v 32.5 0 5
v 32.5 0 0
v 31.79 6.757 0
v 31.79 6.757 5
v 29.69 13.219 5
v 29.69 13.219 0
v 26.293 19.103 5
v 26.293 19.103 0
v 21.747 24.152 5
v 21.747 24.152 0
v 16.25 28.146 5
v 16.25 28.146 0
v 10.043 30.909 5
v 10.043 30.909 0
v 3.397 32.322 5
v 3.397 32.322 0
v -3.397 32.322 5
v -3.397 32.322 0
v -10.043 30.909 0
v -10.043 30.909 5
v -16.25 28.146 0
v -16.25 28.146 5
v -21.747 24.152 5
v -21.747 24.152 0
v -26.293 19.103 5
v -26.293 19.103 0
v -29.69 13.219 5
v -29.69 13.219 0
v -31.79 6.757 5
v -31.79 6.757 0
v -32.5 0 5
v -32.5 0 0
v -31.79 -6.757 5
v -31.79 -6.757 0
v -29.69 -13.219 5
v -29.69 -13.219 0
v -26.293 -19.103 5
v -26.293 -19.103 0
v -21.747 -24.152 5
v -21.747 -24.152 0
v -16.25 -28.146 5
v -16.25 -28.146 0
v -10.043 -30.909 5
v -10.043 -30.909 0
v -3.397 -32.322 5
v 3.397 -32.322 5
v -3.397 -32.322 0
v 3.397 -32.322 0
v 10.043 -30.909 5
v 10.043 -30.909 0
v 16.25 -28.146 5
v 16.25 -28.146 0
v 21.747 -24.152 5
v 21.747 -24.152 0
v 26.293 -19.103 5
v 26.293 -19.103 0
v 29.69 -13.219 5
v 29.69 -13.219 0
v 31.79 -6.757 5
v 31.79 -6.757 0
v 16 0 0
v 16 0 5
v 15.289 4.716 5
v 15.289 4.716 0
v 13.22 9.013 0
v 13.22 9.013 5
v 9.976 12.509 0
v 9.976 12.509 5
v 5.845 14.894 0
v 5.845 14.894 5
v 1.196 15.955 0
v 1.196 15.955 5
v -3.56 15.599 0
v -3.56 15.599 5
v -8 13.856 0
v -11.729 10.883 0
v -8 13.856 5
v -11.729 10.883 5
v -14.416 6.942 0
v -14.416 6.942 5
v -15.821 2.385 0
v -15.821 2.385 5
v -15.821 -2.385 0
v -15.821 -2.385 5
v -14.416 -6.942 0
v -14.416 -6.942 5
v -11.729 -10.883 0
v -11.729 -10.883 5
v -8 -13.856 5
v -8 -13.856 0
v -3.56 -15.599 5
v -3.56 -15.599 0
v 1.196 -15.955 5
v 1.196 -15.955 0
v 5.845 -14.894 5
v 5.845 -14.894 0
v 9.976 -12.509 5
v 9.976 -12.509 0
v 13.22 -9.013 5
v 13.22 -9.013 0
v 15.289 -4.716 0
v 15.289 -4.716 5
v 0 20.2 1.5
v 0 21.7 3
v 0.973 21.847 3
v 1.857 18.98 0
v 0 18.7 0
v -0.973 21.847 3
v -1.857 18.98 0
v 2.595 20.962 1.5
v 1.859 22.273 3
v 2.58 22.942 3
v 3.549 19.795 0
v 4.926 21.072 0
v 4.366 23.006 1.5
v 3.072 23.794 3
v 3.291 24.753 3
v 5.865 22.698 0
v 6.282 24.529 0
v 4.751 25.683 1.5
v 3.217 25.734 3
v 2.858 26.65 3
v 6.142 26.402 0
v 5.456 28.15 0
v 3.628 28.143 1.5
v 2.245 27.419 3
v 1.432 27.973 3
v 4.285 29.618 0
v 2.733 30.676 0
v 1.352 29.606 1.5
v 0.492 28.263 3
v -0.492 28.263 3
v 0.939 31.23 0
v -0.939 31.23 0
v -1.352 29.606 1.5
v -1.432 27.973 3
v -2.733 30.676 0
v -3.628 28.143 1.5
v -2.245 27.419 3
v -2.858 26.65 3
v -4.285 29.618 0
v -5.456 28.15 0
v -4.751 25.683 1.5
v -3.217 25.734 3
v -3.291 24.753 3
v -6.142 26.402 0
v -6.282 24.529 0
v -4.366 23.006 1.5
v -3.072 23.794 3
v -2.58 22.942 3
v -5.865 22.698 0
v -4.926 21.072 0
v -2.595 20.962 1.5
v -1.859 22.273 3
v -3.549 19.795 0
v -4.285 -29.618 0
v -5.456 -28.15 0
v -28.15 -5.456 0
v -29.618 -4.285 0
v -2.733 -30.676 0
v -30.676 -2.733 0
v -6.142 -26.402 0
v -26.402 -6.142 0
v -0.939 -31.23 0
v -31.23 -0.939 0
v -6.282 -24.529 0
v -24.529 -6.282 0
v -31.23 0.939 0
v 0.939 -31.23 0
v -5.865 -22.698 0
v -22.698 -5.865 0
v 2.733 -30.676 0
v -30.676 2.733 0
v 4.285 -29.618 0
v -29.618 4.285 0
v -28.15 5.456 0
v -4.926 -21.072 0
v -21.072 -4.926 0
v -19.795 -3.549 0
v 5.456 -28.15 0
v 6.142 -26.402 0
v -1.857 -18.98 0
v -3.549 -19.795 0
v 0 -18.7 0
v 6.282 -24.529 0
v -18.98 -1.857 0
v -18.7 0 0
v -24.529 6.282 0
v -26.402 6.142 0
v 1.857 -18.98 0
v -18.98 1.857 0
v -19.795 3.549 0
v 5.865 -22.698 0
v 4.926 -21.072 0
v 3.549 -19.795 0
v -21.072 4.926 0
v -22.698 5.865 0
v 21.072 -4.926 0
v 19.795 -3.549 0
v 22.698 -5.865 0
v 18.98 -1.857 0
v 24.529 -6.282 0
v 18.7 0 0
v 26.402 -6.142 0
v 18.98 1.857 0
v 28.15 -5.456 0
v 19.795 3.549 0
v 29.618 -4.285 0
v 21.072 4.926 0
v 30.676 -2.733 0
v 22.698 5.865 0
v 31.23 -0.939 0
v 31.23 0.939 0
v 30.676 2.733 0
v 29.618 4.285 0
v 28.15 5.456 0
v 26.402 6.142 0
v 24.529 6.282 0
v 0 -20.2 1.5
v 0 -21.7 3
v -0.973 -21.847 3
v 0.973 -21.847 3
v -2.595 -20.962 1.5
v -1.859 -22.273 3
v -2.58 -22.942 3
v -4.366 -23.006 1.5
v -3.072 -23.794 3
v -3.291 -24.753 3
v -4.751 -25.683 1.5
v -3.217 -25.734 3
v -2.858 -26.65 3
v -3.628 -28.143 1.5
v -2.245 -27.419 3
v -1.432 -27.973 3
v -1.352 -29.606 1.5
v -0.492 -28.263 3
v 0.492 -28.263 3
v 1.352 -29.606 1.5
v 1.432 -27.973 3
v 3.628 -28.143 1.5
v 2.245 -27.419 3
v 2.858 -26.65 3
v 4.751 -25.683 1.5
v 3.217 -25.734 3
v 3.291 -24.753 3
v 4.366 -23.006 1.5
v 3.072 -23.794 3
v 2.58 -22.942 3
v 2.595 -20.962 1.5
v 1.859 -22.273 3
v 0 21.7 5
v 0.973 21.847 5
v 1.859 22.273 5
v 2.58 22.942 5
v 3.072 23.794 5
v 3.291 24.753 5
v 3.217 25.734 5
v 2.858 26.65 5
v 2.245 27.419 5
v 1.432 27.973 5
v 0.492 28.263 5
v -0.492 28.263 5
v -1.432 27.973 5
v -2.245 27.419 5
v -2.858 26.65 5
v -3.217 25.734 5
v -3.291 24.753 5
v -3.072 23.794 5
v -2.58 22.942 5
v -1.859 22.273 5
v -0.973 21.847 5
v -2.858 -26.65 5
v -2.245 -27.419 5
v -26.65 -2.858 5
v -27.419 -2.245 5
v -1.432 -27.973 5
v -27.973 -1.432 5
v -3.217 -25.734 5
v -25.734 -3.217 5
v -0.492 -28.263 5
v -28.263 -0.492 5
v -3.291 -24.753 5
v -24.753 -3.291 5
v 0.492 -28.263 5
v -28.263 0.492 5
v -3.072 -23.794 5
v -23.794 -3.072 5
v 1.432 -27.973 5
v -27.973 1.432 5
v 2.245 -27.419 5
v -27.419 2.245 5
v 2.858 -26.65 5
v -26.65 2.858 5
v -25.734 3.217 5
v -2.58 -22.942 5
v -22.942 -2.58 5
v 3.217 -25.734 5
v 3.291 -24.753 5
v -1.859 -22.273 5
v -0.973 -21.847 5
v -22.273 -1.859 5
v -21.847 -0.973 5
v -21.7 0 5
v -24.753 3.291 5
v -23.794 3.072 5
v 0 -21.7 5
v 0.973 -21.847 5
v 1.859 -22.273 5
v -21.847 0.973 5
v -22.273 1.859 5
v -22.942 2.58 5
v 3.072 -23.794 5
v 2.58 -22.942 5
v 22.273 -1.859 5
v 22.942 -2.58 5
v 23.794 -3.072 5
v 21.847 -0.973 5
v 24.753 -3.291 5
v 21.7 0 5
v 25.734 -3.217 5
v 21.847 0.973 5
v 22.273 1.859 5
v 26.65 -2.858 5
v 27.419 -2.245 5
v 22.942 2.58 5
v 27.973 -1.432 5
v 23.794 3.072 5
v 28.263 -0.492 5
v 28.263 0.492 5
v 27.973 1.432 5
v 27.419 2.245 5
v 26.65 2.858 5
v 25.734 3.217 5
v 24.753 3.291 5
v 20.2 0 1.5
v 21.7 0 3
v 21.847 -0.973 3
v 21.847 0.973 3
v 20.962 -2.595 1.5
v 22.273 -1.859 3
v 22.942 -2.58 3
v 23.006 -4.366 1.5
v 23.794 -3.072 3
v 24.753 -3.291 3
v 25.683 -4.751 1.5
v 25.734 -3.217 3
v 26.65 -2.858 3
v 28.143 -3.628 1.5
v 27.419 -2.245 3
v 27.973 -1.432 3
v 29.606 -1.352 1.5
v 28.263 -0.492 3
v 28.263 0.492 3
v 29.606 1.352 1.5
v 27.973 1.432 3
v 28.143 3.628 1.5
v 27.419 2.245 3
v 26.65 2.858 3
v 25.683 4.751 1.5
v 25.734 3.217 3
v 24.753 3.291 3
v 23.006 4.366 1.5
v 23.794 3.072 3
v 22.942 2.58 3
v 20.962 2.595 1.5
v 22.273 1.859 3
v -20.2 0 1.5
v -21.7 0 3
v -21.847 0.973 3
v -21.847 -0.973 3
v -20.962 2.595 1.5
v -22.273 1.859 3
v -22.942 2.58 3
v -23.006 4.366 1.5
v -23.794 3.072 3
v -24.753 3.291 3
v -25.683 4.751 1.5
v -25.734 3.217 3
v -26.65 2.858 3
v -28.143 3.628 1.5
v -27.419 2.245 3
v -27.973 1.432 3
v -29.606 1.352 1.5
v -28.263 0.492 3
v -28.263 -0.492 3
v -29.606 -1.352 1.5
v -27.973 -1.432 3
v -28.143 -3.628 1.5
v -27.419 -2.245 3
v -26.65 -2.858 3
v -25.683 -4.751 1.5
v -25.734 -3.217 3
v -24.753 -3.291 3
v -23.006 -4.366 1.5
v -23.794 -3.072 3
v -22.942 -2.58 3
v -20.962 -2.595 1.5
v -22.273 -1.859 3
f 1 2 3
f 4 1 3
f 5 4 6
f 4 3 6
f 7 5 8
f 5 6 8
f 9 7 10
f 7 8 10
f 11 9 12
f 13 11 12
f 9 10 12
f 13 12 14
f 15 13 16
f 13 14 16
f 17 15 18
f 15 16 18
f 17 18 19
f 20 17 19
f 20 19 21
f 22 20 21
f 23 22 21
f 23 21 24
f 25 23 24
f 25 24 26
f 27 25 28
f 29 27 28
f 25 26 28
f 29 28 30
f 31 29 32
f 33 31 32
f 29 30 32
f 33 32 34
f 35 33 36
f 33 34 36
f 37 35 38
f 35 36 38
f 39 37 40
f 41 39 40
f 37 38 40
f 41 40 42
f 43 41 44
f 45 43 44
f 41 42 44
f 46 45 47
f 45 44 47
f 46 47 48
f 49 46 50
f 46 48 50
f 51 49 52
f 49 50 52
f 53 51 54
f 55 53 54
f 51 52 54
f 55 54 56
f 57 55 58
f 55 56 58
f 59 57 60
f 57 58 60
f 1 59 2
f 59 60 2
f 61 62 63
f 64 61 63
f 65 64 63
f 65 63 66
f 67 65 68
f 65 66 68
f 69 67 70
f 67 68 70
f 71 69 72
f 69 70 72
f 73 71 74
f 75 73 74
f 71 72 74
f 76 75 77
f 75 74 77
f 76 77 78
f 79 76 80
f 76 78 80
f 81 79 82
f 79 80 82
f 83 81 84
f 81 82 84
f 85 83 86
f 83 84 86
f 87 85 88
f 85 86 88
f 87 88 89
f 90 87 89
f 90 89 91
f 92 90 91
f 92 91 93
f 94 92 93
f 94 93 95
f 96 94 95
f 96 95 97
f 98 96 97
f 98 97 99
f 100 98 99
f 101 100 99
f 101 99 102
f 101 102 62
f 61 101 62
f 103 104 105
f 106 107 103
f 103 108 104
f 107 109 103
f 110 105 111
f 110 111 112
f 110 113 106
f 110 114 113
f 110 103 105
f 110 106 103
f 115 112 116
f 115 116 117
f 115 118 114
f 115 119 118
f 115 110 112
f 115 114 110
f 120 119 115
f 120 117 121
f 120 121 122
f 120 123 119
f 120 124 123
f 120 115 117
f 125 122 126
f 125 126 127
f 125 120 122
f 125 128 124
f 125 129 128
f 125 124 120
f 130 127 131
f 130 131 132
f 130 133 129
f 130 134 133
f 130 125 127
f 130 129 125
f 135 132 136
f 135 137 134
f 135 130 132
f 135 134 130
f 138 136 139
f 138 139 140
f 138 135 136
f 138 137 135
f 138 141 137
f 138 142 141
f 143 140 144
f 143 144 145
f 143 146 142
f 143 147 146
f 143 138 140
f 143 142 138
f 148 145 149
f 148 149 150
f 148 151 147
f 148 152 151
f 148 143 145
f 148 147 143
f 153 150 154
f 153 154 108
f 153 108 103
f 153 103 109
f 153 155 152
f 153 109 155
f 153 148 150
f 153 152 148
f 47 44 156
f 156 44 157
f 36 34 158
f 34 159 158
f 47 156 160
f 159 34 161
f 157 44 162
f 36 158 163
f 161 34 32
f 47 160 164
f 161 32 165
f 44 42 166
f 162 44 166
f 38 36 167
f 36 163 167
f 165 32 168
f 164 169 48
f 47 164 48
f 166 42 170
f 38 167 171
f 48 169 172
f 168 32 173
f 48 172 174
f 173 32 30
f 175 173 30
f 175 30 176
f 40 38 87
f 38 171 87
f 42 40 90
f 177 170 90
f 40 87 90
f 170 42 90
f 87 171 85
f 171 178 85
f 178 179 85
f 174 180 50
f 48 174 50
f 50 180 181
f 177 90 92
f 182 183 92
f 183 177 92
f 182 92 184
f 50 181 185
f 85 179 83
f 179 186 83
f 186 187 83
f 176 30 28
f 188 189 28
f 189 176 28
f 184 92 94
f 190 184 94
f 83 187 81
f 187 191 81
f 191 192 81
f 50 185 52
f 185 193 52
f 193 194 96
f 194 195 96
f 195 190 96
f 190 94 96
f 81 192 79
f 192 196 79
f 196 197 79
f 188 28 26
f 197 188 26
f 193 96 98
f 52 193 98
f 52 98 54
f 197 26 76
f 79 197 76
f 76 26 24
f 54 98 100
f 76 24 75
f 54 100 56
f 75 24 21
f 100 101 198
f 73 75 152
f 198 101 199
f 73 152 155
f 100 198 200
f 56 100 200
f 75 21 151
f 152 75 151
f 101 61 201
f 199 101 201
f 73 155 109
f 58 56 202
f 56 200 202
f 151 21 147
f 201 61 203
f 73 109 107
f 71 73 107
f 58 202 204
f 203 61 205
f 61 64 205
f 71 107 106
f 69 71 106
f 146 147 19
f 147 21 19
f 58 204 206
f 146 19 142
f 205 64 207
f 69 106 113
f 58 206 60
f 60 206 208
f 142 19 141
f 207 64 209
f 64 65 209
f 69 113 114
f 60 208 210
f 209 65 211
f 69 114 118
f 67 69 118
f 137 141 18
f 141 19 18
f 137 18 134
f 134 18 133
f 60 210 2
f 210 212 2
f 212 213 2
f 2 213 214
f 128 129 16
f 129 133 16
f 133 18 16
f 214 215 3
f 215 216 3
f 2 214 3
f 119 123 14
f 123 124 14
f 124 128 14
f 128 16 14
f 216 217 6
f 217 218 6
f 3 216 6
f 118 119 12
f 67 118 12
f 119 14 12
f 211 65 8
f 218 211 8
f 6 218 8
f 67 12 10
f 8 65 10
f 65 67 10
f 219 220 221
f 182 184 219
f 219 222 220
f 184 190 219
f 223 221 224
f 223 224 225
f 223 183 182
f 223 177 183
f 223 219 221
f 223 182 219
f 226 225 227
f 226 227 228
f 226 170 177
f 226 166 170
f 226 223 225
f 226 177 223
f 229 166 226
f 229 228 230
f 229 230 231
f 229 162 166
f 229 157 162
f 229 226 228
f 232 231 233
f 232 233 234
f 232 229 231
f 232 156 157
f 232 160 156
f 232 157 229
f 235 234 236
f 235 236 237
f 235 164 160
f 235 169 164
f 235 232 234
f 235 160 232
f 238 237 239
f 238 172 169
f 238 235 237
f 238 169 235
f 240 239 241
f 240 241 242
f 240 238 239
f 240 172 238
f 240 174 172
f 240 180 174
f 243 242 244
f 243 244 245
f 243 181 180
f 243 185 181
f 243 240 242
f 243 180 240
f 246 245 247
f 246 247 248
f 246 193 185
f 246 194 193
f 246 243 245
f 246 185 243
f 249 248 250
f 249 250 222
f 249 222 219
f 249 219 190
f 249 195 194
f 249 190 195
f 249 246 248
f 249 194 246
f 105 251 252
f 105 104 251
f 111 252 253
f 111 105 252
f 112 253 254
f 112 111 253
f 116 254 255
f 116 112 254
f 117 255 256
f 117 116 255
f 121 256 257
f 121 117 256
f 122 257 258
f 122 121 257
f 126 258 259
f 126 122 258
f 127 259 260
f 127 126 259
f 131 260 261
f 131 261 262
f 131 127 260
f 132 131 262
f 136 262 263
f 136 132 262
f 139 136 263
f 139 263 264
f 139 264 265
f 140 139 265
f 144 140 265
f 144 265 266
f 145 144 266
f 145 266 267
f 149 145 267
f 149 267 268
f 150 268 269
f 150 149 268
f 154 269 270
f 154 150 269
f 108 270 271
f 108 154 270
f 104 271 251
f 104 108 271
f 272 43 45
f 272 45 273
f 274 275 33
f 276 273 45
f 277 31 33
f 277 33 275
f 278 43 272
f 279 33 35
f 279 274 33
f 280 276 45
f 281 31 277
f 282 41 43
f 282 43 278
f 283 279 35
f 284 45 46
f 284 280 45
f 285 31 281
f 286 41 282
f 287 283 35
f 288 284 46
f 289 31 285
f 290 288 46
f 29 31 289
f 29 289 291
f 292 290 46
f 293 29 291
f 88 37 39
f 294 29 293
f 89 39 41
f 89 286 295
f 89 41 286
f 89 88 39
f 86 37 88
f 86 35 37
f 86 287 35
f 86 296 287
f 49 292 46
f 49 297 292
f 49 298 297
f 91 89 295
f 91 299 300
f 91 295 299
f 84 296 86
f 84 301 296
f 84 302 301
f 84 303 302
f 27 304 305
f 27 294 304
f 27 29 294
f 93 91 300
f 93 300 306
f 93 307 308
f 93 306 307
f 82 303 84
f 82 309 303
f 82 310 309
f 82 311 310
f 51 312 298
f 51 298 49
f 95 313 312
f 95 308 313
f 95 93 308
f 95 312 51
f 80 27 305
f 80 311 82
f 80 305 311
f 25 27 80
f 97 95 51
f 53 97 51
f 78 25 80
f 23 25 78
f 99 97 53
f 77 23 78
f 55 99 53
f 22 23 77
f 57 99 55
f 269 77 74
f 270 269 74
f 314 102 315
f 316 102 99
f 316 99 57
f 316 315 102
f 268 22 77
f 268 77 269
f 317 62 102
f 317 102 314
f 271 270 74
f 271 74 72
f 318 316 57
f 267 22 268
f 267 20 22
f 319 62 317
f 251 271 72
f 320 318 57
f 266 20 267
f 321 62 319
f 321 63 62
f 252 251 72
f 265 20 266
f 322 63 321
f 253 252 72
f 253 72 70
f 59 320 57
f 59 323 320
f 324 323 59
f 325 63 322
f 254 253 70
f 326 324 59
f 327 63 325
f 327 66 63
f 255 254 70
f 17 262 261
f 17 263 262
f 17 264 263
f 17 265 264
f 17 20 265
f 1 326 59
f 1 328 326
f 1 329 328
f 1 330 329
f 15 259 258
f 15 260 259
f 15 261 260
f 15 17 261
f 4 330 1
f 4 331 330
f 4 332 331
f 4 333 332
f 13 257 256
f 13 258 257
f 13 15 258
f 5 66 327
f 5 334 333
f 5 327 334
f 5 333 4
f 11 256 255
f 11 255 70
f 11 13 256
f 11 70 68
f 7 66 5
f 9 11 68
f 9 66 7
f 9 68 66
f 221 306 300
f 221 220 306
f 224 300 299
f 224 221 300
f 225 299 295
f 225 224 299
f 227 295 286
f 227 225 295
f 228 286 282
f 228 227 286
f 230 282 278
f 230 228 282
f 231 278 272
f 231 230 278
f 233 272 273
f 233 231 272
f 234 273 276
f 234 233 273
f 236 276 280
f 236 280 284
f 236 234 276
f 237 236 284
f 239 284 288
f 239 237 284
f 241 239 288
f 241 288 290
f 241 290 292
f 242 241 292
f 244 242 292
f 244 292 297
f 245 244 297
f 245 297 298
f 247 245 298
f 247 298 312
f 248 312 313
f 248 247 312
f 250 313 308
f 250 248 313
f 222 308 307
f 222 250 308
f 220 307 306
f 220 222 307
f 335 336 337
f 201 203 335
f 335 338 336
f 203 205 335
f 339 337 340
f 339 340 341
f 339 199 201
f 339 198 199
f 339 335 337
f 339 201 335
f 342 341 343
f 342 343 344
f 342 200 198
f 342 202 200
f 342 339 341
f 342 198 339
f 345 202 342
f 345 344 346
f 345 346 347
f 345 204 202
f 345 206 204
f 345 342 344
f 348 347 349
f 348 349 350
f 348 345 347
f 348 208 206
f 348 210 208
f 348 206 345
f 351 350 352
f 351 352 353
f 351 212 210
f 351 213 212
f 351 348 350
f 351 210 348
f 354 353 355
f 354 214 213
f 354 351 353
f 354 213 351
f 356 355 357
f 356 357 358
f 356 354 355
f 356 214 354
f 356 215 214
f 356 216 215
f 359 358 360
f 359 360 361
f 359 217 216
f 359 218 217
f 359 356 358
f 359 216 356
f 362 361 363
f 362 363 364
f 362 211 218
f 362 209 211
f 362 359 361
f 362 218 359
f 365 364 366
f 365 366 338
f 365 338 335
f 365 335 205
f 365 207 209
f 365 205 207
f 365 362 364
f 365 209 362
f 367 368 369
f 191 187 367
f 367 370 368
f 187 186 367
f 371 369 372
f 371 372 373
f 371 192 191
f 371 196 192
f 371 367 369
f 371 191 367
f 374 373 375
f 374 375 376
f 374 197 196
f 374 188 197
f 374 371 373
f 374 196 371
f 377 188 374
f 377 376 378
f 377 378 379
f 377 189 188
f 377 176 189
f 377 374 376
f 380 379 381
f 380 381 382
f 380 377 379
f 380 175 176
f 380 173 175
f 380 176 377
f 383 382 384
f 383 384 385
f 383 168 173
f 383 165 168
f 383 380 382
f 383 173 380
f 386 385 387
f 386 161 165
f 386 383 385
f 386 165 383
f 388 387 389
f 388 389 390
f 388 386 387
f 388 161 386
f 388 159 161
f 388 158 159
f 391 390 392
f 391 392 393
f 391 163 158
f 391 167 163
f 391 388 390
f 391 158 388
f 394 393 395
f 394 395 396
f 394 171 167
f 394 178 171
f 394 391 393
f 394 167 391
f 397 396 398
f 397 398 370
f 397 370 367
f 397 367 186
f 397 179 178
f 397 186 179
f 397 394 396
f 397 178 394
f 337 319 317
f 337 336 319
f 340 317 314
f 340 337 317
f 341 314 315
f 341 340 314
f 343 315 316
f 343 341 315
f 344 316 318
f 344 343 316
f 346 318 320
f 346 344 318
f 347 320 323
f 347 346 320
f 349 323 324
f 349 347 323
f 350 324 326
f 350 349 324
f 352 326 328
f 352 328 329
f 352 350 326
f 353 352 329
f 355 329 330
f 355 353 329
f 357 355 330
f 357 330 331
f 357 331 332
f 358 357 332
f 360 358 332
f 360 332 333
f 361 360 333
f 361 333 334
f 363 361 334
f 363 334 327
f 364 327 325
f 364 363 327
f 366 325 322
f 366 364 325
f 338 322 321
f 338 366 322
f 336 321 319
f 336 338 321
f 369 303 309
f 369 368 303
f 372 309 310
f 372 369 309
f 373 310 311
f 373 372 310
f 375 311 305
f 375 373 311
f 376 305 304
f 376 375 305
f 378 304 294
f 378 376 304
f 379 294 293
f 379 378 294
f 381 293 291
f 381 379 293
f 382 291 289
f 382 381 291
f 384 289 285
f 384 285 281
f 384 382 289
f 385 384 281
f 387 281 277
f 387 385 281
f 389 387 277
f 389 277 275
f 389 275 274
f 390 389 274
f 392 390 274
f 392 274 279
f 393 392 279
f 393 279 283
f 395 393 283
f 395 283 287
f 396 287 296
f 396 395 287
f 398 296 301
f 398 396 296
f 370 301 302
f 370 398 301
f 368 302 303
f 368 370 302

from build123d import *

# Parameters (mm, degrees)
ESQUISSE1_R                  = 32.5
BOSS_EXTRU_1_DEPTH           = 5
R_P_TITION_CIRCULAIRE1_COUNT = 4
ESQUISSE2_R                  = 16
ENL_V_MAT_EXTRU_1_DEPTH      = 6


with BuildPart() as part:
    # Esquisse1 → Boss.-Extru.1 (new body)
    with BuildSketch(Plane.XY):
        Circle(ESQUISSE1_R)
    extrude(amount=BOSS_EXTRU_1_DEPTH)

    # Esquisse5 → Fraisage pour vis à tête fraisée M61 (revolve, cut)
    with BuildSketch(Plane(origin=(0, -25, 0), x_dir=(0, 1, 0), z_dir=(1, 0, 0))):
        Polygon((0, 0), (0, 5), (3.3, 5), (3.3, 3), (6.3, 0), align=None)
    fraisage_pour_vis_t_te_frais_e_m61 = revolve(axis=Axis((0, -25, -6.35), (0, 0, 1)), mode=Mode.SUBTRACT)

    # Répétition circulaire1: Fraisage pour vis à tête fraisée M61 ×4 about axis
    r_p_tition_circulaire1_axis = Axis((0, 0, 0), (0, 0, 1))
    for i in range(1, R_P_TITION_CIRCULAIRE1_COUNT):
        add(fraisage_pour_vis_t_te_frais_e_m61.rotate(r_p_tition_circulaire1_axis, i * 360 / R_P_TITION_CIRCULAIRE1_COUNT), mode=Mode.SUBTRACT)

    # Esquisse2 → Enlèv. mat.-Extru.1 (cut, through all)
    with BuildSketch(Plane.XY.offset(5)):
        Circle(ESQUISSE2_R)
    extrude(amount=-ENL_V_MAT_EXTRU_1_DEPTH, mode=Mode.SUBTRACT)


solid = part.part
